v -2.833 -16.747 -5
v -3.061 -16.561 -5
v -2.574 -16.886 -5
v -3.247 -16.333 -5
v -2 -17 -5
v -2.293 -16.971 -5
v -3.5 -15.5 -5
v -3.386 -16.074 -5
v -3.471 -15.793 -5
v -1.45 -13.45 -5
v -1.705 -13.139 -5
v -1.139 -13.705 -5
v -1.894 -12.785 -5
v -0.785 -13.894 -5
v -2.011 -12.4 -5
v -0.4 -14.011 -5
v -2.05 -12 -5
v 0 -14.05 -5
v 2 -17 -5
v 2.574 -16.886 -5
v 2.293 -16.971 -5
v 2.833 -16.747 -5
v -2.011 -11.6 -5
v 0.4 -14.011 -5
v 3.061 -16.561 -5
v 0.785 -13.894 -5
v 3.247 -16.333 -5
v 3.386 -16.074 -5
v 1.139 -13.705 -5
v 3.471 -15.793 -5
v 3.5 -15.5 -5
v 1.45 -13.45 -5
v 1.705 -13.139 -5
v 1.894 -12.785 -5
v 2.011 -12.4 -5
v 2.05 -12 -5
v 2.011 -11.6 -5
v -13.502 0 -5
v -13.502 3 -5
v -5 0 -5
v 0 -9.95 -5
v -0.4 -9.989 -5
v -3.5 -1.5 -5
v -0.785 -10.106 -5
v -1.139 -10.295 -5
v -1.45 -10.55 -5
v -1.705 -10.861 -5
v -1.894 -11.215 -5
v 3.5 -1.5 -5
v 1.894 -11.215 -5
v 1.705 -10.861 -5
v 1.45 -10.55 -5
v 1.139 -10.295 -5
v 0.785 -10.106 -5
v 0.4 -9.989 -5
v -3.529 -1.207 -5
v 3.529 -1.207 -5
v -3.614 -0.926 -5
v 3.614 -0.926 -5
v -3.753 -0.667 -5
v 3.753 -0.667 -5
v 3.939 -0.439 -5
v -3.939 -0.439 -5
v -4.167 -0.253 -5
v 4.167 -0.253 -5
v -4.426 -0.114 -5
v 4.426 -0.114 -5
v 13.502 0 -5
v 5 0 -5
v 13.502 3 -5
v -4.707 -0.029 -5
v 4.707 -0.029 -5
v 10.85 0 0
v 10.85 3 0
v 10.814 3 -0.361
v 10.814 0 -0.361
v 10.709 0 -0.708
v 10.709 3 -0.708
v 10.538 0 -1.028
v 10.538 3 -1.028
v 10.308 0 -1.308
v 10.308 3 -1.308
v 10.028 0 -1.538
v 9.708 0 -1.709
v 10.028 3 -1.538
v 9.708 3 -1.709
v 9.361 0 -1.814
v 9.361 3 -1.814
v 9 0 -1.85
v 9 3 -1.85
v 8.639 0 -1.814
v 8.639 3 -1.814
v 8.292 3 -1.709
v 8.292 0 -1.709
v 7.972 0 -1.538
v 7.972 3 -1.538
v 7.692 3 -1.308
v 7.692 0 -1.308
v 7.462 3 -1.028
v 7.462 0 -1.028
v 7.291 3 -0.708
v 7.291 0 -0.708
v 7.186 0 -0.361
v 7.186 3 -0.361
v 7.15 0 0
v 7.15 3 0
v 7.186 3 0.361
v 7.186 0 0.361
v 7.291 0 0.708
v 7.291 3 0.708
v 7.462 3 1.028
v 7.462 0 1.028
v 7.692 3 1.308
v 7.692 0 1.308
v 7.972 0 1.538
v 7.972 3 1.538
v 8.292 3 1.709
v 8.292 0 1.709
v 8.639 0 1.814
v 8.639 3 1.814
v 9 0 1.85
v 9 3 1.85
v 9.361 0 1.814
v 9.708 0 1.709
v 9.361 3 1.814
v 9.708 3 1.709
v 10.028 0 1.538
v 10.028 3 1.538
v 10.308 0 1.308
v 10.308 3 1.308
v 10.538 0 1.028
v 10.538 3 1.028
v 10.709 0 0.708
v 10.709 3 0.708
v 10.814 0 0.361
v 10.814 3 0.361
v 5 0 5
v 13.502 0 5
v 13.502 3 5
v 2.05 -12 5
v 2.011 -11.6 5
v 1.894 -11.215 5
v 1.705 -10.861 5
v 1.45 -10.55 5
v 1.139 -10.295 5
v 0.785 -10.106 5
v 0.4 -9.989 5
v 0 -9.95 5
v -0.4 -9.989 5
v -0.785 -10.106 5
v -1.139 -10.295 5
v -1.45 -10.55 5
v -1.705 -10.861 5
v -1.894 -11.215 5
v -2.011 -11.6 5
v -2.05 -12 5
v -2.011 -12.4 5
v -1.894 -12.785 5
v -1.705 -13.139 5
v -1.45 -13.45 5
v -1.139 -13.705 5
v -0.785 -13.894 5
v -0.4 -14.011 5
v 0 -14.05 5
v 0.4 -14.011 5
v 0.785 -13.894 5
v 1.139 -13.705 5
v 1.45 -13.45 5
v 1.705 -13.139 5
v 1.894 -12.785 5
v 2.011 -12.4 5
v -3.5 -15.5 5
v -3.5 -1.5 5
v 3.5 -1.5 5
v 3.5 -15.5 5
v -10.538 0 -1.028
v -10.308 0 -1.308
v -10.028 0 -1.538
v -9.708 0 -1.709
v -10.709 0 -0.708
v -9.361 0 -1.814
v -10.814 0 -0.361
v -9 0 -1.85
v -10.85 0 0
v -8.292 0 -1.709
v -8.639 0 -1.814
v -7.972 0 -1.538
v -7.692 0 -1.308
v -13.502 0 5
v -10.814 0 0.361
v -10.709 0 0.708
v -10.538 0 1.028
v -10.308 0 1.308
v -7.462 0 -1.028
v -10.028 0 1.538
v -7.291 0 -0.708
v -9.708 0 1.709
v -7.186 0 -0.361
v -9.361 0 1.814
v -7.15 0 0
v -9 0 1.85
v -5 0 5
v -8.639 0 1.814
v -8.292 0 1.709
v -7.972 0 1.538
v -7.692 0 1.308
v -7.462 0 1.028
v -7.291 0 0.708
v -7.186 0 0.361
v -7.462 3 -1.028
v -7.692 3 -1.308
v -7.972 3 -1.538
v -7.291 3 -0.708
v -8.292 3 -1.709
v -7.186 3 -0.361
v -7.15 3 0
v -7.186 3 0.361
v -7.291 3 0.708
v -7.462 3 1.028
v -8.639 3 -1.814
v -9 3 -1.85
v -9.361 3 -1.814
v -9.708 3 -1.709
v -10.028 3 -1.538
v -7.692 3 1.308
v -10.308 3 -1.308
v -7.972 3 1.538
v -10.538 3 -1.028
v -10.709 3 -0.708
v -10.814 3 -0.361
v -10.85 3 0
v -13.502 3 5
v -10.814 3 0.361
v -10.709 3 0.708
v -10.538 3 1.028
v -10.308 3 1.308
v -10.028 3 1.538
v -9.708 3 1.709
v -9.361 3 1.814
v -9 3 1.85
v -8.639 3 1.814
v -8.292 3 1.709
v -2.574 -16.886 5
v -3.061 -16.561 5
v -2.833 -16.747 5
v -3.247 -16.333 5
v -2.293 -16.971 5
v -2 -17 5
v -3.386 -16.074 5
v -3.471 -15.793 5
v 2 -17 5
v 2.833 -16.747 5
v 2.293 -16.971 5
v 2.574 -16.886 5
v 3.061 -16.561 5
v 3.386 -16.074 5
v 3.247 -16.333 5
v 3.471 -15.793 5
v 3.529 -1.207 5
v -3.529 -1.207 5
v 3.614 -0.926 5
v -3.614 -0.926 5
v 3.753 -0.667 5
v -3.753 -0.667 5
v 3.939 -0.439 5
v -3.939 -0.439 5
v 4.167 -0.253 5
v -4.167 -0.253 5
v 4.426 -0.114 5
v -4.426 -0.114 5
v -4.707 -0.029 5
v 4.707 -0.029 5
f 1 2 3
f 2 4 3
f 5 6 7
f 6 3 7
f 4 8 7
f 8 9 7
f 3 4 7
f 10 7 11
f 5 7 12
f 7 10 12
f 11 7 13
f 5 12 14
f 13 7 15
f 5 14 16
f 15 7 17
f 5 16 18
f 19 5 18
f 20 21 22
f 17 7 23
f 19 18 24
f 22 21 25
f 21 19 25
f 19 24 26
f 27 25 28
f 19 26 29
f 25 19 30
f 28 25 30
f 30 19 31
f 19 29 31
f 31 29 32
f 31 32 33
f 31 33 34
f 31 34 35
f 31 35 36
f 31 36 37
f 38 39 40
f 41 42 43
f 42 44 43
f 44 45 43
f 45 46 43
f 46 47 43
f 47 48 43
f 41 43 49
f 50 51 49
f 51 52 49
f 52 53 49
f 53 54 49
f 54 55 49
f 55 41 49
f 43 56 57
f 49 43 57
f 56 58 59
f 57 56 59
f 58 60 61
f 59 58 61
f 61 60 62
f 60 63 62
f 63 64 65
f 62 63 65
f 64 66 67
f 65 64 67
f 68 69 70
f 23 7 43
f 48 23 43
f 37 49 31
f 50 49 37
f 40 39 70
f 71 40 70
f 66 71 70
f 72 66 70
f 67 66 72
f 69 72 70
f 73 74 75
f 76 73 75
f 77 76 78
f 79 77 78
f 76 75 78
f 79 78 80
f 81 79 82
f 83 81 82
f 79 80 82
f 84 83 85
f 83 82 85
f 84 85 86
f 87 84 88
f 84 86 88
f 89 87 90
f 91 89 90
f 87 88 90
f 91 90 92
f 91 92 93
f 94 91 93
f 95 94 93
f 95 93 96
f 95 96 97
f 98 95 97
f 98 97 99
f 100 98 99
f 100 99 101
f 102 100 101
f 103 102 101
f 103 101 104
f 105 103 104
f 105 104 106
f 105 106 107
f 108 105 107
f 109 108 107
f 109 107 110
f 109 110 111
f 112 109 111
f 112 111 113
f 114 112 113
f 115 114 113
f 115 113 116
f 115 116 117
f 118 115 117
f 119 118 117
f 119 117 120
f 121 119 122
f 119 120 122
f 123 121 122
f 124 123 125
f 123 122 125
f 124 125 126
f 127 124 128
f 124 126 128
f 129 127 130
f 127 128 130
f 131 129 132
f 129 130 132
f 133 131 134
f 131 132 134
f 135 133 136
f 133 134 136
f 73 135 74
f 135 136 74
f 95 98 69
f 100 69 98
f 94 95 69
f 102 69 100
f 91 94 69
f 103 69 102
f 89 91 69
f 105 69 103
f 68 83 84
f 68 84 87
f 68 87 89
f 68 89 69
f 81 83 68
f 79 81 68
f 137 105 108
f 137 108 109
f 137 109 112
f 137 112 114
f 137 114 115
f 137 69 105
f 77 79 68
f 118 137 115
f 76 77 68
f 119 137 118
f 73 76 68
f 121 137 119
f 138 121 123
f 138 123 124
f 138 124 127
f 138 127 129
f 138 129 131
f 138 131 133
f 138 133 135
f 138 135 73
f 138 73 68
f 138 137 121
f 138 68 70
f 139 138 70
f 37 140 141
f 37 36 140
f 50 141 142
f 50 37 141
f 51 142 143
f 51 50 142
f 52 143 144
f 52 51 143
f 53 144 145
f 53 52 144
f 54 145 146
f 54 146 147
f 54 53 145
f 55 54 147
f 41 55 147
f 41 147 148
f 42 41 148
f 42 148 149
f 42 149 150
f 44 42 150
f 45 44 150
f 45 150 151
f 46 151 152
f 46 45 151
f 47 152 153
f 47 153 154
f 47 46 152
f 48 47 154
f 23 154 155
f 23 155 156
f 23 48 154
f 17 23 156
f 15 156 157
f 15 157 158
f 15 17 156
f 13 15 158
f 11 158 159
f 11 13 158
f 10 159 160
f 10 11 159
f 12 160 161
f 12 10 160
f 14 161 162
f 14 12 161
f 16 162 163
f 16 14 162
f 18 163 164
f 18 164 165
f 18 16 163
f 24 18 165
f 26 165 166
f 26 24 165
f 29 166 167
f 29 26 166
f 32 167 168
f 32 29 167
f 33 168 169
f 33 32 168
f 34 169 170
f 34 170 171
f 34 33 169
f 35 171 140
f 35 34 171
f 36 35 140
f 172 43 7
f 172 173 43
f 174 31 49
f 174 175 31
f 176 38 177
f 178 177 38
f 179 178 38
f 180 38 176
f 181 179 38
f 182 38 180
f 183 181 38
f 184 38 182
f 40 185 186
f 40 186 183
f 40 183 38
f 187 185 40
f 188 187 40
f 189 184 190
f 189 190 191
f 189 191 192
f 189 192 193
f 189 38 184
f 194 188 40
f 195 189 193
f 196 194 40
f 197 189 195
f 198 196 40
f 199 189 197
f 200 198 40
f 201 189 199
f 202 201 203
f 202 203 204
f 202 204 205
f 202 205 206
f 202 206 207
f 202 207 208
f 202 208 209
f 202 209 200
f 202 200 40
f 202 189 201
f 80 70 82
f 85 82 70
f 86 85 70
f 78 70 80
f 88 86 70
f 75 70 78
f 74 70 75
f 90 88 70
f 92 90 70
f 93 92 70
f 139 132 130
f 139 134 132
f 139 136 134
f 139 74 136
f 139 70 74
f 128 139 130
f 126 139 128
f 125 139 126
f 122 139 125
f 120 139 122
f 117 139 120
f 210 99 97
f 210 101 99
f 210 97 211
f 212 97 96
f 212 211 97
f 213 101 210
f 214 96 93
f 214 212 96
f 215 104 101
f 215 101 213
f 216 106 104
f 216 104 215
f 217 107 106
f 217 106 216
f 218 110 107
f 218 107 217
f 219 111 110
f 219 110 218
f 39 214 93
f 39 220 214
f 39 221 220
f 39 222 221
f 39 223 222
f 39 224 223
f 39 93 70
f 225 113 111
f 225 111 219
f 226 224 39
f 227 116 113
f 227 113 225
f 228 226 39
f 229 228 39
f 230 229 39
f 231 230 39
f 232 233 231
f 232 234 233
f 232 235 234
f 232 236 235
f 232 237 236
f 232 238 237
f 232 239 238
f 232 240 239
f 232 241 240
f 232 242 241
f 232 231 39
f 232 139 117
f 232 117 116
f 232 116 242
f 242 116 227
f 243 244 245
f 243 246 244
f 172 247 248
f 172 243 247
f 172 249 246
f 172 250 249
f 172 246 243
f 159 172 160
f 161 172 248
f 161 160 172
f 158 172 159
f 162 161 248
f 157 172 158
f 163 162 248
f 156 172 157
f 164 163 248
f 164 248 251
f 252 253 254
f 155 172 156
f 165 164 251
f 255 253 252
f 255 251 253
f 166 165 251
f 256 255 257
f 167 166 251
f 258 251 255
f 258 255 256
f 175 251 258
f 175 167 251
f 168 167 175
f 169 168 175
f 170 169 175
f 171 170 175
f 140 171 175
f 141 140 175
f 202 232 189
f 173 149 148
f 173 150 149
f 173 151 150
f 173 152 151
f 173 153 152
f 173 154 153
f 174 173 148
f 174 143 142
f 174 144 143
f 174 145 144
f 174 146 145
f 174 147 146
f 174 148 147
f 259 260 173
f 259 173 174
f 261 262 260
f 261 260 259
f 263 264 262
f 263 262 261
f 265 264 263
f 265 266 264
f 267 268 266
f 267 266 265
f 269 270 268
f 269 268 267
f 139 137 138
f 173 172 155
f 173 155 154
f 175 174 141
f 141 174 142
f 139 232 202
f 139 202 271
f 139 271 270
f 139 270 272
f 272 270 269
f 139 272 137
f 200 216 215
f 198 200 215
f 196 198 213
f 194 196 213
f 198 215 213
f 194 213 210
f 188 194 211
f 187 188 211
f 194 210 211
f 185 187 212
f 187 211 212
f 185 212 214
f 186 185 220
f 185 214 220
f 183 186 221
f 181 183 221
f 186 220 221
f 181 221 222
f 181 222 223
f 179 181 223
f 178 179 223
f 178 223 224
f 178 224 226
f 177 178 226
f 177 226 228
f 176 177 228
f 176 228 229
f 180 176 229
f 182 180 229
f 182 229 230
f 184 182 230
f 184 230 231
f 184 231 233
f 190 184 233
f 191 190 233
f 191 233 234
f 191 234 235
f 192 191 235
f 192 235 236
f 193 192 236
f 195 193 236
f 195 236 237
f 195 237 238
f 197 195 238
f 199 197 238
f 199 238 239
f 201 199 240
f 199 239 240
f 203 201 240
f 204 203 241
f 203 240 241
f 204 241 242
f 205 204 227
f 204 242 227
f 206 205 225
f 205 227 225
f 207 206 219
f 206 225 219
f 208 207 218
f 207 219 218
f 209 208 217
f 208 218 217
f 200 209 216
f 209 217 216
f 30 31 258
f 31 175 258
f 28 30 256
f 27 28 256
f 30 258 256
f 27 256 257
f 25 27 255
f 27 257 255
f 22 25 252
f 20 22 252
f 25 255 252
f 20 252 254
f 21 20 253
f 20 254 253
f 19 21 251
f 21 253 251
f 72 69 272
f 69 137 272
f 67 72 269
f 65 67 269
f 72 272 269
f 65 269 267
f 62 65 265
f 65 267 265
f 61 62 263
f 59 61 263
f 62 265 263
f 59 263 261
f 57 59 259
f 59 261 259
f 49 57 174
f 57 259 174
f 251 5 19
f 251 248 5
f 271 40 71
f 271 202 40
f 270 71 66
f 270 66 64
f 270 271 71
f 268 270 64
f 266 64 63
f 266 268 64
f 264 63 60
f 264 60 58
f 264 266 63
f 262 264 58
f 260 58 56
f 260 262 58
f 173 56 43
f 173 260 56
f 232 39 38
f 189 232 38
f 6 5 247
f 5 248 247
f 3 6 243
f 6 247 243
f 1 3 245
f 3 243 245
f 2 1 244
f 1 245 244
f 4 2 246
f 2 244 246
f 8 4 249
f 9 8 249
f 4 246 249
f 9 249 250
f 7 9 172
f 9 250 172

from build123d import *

# Parameters (mm, degrees)
SKETCH1_R           = 2.05
BOSS_EXTRUDE1_DEPTH = 5
FILLET1_R           = 1.5
SKETCH2_R           = 1.85
CUT_EXTRUDE1_DEPTH  = 21


with BuildPart() as part:
    # Sketch1 → Boss-Extrude1 (new body, symmetric)
    with BuildSketch(Plane.XY):
        Polygon((-13.502392344, 0), (-3.5, 0), (-3.5, -17), (3.5, -17), (3.5, 0), (13.502392344, 0), (13.502392344, 3), (-13.502392344, 3), align=None)
        with Locations((0, -12)):
            Circle(SKETCH1_R, mode=Mode.SUBTRACT)
    extrude(amount=BOSS_EXTRUDE1_DEPTH, both=True)

    # Fillet1
    fillet1_edges = [part.edges().sort_by_distance(p)[0] for p in [
        (3.5, 0, 0),
        (3.5, -17, 0),
        (-3.5, -17, 0),
        (-3.5, 0, 0),
    ]]
    fillet(fillet1_edges, radius=FILLET1_R)

    # Sketch2 → Cut-Extrude1 (cut, through all)
    with BuildSketch(Plane(origin=(0, 3, 0), x_dir=(1, 0, 0), z_dir=(0, 1, 0))):
        with Locations((-9, 0)):
            Circle(SKETCH2_R)
        with Locations((9, 0)):
            Circle(SKETCH2_R)
    extrude(amount=-CUT_EXTRUDE1_DEPTH, mode=Mode.SUBTRACT)


solid = part.part
